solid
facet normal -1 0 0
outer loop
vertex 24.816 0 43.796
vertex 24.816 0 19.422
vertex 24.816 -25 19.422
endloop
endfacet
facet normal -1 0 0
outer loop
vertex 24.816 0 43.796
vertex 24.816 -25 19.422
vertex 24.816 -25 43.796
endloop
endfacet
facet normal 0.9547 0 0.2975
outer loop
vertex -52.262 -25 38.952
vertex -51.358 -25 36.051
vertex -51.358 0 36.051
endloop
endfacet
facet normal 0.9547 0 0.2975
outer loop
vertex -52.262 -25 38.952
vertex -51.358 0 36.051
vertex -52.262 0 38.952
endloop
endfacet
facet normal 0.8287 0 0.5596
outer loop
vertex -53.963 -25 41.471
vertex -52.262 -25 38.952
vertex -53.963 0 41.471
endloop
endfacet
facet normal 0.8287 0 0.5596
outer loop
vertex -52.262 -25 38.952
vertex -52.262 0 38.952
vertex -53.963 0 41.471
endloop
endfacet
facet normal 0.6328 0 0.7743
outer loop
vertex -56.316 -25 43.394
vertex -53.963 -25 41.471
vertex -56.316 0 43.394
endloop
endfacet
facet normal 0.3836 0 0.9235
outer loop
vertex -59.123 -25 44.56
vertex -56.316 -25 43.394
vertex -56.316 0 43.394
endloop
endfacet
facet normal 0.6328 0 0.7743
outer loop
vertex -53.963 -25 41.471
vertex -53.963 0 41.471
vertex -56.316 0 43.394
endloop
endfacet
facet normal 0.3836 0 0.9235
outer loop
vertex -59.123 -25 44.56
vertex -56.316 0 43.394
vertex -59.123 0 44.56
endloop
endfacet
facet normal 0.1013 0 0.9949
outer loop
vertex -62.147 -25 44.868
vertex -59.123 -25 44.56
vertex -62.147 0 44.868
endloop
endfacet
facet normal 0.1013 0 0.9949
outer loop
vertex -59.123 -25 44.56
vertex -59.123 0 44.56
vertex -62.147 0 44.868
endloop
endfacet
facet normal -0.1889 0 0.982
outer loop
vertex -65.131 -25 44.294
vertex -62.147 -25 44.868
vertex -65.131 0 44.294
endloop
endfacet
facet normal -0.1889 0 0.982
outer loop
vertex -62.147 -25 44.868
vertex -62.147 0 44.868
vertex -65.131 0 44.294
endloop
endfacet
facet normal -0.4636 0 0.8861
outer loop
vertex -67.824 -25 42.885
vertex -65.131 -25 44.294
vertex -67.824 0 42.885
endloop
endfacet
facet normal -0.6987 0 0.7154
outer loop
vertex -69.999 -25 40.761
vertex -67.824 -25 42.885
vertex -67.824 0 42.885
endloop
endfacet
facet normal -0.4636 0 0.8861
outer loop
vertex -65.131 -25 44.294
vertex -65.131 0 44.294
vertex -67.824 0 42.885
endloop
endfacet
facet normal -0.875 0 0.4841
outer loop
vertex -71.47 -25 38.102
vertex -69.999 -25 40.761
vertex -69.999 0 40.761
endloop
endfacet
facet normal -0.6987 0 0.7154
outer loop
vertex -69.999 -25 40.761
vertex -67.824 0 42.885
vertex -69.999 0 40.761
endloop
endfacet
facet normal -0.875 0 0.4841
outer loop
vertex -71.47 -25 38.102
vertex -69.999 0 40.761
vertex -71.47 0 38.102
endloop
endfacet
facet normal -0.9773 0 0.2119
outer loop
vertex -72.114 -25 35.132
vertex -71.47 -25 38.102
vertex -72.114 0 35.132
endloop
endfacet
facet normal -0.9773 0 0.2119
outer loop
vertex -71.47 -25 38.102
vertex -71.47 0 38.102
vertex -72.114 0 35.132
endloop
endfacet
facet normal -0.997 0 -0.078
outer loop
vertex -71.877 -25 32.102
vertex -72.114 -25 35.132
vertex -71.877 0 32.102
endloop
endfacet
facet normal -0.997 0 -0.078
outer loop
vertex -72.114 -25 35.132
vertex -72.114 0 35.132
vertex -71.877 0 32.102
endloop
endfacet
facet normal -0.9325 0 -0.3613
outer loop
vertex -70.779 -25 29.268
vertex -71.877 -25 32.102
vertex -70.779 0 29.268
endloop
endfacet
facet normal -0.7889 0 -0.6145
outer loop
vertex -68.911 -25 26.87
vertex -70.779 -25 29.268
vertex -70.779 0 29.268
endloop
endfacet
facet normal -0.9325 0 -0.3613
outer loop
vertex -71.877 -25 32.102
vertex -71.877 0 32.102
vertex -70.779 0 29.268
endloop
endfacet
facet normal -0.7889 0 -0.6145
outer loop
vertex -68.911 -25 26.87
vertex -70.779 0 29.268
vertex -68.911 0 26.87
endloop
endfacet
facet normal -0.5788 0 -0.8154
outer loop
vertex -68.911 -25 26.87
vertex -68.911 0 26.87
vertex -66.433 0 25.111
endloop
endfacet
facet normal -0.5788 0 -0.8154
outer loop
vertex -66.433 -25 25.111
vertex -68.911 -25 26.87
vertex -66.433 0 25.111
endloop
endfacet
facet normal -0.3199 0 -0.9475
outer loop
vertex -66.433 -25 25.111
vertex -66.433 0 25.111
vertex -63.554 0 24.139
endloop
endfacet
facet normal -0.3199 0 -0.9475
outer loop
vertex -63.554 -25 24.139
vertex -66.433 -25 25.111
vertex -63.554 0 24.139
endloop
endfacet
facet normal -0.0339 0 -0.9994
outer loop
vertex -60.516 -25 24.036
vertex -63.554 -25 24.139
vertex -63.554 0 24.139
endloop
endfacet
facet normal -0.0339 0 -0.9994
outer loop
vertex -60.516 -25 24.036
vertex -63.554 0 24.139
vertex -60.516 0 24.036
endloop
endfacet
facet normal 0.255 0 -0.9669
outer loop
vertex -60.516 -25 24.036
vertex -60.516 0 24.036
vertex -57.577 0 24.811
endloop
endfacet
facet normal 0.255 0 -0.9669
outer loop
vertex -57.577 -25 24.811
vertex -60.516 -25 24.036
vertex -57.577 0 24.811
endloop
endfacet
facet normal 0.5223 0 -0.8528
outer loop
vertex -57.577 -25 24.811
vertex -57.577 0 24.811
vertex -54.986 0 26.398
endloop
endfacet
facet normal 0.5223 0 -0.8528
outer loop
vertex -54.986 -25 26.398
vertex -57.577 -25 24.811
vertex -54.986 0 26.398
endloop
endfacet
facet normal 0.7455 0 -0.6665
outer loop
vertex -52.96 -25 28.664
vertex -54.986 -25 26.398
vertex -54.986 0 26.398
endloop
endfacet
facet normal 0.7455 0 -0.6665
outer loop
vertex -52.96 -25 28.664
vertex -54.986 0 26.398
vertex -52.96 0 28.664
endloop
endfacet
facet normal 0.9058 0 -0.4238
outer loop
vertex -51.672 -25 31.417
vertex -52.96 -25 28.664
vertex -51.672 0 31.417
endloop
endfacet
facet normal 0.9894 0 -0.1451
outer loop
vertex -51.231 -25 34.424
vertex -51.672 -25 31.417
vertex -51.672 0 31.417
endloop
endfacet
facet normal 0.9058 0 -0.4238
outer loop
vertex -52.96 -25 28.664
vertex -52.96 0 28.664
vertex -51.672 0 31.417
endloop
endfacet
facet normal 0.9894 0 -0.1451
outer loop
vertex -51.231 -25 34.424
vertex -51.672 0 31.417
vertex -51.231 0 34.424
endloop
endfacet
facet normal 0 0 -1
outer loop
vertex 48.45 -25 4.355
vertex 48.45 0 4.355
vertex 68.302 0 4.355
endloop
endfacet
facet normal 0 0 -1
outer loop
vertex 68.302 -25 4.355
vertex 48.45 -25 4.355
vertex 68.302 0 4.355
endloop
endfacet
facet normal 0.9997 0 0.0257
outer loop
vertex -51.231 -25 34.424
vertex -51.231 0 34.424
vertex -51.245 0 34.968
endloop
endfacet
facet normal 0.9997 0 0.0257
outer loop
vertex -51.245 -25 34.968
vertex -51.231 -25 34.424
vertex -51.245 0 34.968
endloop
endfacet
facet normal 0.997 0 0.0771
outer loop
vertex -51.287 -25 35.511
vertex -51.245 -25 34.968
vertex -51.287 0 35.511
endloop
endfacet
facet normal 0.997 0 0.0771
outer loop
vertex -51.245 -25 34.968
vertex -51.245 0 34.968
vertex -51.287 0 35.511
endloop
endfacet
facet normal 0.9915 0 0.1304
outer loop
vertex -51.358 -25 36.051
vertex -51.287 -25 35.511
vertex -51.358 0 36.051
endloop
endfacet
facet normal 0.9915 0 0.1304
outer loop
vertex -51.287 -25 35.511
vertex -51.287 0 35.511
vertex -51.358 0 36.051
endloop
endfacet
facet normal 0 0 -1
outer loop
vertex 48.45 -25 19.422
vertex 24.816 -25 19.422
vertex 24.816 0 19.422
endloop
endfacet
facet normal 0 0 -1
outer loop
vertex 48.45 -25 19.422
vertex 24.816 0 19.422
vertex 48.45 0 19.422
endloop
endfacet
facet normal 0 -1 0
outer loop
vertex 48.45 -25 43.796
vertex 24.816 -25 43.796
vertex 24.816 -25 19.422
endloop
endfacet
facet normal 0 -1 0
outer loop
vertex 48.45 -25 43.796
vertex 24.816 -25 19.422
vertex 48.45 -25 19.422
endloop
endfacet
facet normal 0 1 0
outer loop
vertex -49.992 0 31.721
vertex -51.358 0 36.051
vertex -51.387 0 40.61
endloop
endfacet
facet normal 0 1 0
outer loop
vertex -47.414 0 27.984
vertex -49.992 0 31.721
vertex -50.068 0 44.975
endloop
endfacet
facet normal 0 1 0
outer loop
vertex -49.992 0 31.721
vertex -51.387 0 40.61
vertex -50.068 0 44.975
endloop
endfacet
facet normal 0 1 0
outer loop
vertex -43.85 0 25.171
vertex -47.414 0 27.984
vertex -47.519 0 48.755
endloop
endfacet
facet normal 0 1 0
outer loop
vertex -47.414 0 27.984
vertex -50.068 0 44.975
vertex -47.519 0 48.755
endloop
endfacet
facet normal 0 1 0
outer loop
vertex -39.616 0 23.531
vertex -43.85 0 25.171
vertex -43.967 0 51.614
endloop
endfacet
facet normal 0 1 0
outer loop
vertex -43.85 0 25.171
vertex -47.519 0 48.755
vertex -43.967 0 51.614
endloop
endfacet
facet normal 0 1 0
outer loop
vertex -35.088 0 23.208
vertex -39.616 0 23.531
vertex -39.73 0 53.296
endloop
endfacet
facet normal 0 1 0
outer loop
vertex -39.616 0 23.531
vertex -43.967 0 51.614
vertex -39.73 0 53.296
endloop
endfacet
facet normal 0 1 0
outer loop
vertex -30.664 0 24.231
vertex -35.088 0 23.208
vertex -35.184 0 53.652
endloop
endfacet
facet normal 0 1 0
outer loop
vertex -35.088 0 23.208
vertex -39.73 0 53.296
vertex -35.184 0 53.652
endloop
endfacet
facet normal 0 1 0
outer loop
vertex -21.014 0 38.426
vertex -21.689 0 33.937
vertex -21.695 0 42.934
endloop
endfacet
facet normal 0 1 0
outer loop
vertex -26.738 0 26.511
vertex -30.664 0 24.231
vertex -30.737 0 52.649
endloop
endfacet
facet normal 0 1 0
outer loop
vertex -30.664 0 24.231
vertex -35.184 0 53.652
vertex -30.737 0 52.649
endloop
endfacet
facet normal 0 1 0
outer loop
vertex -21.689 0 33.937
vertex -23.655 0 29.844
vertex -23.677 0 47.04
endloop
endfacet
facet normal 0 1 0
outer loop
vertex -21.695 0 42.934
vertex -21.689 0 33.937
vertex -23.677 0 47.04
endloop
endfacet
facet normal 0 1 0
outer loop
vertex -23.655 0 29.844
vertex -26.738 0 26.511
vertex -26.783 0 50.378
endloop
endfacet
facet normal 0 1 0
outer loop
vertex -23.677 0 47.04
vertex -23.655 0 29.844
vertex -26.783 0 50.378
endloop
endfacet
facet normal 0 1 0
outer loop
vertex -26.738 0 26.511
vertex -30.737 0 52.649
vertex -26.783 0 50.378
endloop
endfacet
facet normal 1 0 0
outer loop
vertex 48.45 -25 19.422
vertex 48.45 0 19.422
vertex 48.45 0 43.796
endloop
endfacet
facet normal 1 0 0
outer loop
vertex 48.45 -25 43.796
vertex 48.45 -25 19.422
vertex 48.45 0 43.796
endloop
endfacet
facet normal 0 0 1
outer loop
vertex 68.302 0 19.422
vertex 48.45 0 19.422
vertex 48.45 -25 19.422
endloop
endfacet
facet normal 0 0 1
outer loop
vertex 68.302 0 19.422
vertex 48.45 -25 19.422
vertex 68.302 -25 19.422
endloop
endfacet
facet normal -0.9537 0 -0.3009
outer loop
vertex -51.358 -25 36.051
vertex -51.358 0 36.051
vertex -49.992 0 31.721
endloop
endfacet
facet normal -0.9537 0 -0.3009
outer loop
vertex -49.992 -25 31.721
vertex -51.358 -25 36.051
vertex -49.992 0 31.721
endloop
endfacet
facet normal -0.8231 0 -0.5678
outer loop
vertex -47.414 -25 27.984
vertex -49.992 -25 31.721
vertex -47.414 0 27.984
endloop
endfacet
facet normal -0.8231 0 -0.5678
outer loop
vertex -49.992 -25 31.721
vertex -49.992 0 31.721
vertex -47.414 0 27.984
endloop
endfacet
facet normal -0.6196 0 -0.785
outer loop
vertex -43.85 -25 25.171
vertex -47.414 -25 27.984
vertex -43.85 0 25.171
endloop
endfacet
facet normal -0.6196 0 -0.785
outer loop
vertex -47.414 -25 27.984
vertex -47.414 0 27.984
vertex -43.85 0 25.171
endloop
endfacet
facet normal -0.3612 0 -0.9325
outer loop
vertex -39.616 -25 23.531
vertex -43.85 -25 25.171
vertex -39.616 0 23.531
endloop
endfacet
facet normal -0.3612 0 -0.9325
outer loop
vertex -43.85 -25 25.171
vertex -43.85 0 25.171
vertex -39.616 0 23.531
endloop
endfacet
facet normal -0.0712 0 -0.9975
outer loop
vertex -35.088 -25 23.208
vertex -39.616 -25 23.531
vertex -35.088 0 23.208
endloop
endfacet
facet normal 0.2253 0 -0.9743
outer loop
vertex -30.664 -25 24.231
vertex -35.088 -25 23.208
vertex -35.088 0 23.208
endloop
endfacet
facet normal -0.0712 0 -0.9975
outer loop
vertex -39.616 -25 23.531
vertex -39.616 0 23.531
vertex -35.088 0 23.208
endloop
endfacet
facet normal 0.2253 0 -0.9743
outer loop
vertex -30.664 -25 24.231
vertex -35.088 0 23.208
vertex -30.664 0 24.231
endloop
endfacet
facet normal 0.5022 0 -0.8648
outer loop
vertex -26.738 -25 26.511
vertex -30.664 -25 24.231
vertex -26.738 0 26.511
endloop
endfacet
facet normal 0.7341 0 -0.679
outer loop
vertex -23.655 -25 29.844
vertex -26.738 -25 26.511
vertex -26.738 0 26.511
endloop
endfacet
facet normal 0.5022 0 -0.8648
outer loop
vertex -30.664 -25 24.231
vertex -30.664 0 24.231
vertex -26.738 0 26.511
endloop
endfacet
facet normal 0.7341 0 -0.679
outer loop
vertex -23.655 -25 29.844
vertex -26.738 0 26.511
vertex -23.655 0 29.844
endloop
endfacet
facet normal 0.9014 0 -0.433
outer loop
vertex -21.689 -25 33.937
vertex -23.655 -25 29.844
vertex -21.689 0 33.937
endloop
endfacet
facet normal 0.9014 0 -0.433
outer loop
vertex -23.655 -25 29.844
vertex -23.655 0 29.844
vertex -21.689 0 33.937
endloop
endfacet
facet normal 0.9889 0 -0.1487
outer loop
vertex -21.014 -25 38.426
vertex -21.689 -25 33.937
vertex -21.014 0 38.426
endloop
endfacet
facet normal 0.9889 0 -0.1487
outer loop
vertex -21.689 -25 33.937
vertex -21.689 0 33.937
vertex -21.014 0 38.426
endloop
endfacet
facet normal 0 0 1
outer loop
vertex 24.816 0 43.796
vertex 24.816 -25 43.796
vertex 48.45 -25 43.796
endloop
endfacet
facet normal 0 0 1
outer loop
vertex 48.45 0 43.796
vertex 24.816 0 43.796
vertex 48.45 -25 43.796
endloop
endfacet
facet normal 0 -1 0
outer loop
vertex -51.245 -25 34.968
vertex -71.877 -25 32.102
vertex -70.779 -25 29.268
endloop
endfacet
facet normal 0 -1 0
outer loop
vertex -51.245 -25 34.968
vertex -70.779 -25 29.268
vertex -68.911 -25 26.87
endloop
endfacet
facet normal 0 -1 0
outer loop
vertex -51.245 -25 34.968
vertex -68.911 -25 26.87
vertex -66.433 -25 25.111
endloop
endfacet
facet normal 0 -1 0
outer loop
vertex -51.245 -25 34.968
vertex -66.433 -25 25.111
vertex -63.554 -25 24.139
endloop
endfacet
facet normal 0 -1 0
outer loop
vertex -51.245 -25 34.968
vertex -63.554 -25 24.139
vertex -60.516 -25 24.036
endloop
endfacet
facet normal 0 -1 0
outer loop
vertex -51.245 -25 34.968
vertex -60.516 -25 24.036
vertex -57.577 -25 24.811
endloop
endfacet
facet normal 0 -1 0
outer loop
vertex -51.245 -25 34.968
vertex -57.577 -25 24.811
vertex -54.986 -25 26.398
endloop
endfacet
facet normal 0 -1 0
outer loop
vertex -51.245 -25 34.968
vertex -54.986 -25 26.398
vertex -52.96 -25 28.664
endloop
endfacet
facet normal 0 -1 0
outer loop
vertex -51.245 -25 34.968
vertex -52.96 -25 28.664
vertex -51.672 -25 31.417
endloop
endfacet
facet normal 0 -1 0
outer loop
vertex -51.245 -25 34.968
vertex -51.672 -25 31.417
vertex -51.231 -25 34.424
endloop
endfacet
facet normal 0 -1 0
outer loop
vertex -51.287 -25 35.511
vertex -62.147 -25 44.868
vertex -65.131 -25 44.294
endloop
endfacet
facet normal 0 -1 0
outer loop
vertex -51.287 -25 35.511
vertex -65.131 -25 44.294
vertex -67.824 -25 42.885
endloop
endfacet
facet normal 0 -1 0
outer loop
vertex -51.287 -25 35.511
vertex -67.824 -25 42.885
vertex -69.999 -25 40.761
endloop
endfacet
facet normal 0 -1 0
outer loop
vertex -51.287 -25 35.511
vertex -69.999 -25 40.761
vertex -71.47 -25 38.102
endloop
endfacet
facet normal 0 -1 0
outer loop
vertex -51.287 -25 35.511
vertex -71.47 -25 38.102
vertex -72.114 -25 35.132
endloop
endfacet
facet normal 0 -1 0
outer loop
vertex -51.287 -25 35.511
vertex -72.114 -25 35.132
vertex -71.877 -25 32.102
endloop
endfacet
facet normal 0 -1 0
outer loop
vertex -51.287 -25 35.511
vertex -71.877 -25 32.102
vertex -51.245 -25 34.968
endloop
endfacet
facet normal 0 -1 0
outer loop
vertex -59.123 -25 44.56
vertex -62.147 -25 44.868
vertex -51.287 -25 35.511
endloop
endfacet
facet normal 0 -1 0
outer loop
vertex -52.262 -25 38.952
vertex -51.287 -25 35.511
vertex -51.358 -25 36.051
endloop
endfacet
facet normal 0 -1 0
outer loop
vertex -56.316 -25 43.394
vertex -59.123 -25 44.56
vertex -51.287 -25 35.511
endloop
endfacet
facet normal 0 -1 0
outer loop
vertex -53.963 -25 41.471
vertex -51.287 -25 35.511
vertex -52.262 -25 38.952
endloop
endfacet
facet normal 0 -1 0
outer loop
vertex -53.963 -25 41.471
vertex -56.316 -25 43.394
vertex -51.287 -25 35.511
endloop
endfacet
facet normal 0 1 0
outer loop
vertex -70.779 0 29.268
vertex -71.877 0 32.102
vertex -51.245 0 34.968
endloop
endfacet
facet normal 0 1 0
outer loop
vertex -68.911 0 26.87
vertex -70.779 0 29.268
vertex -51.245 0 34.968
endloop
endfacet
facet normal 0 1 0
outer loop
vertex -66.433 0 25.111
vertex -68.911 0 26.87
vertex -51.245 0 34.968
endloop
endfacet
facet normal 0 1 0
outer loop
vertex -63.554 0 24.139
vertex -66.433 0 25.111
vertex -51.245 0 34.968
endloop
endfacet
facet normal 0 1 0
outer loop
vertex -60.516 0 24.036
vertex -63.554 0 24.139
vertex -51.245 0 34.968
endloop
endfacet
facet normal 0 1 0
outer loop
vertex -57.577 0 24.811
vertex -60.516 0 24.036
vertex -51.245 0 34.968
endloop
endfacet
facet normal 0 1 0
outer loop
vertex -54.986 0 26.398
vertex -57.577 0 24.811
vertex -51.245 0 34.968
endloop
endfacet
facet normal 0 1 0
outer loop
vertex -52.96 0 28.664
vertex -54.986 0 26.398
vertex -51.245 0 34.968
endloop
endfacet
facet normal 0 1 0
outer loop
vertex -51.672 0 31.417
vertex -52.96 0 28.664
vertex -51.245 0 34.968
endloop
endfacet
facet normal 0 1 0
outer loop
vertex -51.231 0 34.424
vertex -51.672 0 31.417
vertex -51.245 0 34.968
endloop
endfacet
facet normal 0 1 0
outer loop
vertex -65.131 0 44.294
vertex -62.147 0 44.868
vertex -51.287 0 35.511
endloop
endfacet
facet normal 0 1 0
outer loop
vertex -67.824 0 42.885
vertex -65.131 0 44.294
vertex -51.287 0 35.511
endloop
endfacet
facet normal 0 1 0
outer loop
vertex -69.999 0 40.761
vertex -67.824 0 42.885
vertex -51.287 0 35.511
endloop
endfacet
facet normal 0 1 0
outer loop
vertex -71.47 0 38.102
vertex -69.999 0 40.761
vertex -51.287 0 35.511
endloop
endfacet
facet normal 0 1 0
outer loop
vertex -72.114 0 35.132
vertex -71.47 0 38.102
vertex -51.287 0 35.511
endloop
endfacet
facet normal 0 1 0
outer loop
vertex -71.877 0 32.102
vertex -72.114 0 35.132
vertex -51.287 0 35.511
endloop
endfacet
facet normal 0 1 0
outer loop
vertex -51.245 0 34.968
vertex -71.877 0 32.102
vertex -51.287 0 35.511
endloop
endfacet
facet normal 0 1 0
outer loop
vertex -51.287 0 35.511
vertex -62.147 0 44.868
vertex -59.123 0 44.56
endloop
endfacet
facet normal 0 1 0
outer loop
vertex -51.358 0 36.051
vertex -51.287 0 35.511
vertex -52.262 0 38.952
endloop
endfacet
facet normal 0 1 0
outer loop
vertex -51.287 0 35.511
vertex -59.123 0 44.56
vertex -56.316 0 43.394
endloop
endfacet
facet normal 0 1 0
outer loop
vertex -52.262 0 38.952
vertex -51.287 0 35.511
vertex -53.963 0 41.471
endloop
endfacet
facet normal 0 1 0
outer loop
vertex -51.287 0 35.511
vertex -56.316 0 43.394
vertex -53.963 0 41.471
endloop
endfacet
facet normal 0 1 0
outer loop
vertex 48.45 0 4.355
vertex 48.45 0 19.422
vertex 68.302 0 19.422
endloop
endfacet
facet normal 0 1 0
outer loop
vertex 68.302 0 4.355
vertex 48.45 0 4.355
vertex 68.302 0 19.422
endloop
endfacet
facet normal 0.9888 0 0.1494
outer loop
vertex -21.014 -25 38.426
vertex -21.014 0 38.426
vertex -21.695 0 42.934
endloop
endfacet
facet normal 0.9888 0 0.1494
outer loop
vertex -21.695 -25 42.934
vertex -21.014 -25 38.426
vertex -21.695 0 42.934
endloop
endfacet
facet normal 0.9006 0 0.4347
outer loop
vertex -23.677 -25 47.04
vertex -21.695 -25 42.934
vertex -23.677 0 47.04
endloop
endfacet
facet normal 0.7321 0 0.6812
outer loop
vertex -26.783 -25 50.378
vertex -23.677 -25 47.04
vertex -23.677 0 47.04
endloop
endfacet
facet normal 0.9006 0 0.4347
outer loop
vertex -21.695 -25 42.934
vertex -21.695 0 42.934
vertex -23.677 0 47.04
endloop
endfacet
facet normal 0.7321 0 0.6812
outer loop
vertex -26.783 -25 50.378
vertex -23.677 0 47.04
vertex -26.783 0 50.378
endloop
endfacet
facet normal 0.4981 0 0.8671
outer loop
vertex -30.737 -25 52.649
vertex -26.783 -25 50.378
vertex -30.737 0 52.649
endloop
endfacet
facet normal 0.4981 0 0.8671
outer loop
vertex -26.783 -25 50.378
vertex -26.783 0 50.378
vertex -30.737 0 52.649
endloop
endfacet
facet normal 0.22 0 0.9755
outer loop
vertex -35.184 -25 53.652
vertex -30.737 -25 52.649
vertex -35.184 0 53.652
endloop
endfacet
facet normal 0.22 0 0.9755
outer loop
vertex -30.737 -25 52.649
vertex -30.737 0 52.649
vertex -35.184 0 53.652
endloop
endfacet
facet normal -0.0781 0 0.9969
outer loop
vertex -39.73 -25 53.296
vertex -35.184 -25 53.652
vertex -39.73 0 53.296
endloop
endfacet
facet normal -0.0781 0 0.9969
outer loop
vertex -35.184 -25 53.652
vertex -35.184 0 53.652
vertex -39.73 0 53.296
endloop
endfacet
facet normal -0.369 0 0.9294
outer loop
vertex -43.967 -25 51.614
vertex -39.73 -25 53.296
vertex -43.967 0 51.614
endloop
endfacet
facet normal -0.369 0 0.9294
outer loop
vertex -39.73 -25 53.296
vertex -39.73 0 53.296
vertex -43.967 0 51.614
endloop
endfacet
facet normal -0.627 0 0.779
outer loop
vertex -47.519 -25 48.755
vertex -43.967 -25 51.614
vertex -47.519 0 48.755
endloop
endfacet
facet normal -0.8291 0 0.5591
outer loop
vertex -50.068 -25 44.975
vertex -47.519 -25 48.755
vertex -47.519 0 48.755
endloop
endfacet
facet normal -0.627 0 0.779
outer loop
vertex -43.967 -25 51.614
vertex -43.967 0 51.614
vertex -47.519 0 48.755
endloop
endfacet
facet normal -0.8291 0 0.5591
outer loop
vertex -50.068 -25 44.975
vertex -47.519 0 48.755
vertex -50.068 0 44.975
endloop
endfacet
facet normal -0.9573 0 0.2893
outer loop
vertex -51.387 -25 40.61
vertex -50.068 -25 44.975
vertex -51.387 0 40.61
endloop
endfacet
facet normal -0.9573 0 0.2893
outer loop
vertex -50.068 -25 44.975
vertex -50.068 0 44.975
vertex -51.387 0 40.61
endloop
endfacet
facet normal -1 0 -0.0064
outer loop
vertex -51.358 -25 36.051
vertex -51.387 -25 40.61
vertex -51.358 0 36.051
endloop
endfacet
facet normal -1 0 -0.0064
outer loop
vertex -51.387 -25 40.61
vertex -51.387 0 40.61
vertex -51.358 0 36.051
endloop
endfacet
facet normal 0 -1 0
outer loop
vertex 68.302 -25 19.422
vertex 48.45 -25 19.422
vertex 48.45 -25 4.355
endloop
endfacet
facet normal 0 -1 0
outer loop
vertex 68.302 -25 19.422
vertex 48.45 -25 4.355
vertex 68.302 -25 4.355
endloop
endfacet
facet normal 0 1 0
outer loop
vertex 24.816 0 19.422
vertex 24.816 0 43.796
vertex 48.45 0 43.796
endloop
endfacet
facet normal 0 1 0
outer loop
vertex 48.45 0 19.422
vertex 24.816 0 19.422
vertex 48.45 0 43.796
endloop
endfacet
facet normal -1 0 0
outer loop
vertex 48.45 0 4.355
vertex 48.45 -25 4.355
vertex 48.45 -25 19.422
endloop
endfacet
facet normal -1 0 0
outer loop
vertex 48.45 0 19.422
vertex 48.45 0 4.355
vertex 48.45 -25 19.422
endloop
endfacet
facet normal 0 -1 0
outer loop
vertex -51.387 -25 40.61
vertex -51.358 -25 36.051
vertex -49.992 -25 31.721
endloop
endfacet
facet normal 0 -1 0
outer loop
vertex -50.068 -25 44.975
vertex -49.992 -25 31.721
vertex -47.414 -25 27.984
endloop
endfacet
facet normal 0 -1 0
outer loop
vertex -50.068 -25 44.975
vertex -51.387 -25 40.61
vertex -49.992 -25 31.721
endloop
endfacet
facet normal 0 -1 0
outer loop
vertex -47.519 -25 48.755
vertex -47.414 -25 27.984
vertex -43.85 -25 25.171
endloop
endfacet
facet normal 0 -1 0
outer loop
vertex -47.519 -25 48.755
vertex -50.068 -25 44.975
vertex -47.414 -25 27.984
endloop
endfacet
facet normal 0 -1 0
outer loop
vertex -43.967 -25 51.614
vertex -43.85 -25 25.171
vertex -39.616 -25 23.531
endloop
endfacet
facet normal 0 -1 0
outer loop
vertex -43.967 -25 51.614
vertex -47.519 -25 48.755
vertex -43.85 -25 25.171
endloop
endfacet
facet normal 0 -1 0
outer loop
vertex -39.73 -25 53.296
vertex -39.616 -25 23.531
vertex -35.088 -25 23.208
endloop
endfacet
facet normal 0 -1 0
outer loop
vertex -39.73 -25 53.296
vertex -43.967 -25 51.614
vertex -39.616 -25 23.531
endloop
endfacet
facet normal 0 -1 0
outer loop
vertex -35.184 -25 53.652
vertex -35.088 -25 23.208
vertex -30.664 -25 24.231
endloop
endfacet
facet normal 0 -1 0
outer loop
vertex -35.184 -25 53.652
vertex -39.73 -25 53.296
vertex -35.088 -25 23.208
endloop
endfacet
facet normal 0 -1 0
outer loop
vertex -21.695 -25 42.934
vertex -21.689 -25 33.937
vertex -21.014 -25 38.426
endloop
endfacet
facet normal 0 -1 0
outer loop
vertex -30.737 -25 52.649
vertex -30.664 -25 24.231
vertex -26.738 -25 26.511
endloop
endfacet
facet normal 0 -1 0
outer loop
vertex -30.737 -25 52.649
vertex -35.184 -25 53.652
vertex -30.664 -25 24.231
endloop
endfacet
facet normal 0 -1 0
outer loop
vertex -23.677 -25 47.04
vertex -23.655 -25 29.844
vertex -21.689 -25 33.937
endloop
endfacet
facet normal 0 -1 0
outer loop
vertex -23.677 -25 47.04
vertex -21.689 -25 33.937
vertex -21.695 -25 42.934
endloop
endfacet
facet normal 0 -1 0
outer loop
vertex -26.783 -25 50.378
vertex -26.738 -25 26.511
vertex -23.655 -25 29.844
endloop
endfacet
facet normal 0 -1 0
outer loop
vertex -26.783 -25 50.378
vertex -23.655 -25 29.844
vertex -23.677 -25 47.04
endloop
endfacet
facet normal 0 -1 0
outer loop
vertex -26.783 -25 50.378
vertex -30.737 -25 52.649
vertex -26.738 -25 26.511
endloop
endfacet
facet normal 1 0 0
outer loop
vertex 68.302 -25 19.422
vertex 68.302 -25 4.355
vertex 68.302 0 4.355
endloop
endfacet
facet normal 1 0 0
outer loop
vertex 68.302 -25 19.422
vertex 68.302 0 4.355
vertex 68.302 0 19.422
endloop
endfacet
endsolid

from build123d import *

# Parameters (mm, degrees)
F0_W     = 19.852486
F0_H     = 15.066933
F0_W_2   = 23.633929
F0_H_2   = 24.374241
F1_DEPTH = 25


with BuildPart() as f1:
    # F0 (on Front) → F1 (new body)
    with BuildSketch(Plane.XZ):
        with BuildLine():
            ThreePointArc((-51.357949, 36.050899), (-72.106568, 33.608335), (-51.230608, 34.424182))
            ThreePointArc((-51.230608, 34.424182), (-51.262492, 35.240029), (-51.357949, 36.050899))
        make_face()
        with BuildLine():
            ThreePointArc((-21.01425, 38.426233), (-37.470372, 53.644497), (-51.357949, 36.050899))
            ThreePointArc((-51.357949, 36.050899), (-35.087771, 23.207969), (-21.01425, 38.426233))
        make_face()
        with Locations((58.375785, 11.888516)):
            Rectangle(F0_W, F0_H)
        with Locations((36.632577, 31.609102)):
            Rectangle(F0_W_2, F0_H_2)
    extrude(amount=F1_DEPTH)


solid = f1.part
